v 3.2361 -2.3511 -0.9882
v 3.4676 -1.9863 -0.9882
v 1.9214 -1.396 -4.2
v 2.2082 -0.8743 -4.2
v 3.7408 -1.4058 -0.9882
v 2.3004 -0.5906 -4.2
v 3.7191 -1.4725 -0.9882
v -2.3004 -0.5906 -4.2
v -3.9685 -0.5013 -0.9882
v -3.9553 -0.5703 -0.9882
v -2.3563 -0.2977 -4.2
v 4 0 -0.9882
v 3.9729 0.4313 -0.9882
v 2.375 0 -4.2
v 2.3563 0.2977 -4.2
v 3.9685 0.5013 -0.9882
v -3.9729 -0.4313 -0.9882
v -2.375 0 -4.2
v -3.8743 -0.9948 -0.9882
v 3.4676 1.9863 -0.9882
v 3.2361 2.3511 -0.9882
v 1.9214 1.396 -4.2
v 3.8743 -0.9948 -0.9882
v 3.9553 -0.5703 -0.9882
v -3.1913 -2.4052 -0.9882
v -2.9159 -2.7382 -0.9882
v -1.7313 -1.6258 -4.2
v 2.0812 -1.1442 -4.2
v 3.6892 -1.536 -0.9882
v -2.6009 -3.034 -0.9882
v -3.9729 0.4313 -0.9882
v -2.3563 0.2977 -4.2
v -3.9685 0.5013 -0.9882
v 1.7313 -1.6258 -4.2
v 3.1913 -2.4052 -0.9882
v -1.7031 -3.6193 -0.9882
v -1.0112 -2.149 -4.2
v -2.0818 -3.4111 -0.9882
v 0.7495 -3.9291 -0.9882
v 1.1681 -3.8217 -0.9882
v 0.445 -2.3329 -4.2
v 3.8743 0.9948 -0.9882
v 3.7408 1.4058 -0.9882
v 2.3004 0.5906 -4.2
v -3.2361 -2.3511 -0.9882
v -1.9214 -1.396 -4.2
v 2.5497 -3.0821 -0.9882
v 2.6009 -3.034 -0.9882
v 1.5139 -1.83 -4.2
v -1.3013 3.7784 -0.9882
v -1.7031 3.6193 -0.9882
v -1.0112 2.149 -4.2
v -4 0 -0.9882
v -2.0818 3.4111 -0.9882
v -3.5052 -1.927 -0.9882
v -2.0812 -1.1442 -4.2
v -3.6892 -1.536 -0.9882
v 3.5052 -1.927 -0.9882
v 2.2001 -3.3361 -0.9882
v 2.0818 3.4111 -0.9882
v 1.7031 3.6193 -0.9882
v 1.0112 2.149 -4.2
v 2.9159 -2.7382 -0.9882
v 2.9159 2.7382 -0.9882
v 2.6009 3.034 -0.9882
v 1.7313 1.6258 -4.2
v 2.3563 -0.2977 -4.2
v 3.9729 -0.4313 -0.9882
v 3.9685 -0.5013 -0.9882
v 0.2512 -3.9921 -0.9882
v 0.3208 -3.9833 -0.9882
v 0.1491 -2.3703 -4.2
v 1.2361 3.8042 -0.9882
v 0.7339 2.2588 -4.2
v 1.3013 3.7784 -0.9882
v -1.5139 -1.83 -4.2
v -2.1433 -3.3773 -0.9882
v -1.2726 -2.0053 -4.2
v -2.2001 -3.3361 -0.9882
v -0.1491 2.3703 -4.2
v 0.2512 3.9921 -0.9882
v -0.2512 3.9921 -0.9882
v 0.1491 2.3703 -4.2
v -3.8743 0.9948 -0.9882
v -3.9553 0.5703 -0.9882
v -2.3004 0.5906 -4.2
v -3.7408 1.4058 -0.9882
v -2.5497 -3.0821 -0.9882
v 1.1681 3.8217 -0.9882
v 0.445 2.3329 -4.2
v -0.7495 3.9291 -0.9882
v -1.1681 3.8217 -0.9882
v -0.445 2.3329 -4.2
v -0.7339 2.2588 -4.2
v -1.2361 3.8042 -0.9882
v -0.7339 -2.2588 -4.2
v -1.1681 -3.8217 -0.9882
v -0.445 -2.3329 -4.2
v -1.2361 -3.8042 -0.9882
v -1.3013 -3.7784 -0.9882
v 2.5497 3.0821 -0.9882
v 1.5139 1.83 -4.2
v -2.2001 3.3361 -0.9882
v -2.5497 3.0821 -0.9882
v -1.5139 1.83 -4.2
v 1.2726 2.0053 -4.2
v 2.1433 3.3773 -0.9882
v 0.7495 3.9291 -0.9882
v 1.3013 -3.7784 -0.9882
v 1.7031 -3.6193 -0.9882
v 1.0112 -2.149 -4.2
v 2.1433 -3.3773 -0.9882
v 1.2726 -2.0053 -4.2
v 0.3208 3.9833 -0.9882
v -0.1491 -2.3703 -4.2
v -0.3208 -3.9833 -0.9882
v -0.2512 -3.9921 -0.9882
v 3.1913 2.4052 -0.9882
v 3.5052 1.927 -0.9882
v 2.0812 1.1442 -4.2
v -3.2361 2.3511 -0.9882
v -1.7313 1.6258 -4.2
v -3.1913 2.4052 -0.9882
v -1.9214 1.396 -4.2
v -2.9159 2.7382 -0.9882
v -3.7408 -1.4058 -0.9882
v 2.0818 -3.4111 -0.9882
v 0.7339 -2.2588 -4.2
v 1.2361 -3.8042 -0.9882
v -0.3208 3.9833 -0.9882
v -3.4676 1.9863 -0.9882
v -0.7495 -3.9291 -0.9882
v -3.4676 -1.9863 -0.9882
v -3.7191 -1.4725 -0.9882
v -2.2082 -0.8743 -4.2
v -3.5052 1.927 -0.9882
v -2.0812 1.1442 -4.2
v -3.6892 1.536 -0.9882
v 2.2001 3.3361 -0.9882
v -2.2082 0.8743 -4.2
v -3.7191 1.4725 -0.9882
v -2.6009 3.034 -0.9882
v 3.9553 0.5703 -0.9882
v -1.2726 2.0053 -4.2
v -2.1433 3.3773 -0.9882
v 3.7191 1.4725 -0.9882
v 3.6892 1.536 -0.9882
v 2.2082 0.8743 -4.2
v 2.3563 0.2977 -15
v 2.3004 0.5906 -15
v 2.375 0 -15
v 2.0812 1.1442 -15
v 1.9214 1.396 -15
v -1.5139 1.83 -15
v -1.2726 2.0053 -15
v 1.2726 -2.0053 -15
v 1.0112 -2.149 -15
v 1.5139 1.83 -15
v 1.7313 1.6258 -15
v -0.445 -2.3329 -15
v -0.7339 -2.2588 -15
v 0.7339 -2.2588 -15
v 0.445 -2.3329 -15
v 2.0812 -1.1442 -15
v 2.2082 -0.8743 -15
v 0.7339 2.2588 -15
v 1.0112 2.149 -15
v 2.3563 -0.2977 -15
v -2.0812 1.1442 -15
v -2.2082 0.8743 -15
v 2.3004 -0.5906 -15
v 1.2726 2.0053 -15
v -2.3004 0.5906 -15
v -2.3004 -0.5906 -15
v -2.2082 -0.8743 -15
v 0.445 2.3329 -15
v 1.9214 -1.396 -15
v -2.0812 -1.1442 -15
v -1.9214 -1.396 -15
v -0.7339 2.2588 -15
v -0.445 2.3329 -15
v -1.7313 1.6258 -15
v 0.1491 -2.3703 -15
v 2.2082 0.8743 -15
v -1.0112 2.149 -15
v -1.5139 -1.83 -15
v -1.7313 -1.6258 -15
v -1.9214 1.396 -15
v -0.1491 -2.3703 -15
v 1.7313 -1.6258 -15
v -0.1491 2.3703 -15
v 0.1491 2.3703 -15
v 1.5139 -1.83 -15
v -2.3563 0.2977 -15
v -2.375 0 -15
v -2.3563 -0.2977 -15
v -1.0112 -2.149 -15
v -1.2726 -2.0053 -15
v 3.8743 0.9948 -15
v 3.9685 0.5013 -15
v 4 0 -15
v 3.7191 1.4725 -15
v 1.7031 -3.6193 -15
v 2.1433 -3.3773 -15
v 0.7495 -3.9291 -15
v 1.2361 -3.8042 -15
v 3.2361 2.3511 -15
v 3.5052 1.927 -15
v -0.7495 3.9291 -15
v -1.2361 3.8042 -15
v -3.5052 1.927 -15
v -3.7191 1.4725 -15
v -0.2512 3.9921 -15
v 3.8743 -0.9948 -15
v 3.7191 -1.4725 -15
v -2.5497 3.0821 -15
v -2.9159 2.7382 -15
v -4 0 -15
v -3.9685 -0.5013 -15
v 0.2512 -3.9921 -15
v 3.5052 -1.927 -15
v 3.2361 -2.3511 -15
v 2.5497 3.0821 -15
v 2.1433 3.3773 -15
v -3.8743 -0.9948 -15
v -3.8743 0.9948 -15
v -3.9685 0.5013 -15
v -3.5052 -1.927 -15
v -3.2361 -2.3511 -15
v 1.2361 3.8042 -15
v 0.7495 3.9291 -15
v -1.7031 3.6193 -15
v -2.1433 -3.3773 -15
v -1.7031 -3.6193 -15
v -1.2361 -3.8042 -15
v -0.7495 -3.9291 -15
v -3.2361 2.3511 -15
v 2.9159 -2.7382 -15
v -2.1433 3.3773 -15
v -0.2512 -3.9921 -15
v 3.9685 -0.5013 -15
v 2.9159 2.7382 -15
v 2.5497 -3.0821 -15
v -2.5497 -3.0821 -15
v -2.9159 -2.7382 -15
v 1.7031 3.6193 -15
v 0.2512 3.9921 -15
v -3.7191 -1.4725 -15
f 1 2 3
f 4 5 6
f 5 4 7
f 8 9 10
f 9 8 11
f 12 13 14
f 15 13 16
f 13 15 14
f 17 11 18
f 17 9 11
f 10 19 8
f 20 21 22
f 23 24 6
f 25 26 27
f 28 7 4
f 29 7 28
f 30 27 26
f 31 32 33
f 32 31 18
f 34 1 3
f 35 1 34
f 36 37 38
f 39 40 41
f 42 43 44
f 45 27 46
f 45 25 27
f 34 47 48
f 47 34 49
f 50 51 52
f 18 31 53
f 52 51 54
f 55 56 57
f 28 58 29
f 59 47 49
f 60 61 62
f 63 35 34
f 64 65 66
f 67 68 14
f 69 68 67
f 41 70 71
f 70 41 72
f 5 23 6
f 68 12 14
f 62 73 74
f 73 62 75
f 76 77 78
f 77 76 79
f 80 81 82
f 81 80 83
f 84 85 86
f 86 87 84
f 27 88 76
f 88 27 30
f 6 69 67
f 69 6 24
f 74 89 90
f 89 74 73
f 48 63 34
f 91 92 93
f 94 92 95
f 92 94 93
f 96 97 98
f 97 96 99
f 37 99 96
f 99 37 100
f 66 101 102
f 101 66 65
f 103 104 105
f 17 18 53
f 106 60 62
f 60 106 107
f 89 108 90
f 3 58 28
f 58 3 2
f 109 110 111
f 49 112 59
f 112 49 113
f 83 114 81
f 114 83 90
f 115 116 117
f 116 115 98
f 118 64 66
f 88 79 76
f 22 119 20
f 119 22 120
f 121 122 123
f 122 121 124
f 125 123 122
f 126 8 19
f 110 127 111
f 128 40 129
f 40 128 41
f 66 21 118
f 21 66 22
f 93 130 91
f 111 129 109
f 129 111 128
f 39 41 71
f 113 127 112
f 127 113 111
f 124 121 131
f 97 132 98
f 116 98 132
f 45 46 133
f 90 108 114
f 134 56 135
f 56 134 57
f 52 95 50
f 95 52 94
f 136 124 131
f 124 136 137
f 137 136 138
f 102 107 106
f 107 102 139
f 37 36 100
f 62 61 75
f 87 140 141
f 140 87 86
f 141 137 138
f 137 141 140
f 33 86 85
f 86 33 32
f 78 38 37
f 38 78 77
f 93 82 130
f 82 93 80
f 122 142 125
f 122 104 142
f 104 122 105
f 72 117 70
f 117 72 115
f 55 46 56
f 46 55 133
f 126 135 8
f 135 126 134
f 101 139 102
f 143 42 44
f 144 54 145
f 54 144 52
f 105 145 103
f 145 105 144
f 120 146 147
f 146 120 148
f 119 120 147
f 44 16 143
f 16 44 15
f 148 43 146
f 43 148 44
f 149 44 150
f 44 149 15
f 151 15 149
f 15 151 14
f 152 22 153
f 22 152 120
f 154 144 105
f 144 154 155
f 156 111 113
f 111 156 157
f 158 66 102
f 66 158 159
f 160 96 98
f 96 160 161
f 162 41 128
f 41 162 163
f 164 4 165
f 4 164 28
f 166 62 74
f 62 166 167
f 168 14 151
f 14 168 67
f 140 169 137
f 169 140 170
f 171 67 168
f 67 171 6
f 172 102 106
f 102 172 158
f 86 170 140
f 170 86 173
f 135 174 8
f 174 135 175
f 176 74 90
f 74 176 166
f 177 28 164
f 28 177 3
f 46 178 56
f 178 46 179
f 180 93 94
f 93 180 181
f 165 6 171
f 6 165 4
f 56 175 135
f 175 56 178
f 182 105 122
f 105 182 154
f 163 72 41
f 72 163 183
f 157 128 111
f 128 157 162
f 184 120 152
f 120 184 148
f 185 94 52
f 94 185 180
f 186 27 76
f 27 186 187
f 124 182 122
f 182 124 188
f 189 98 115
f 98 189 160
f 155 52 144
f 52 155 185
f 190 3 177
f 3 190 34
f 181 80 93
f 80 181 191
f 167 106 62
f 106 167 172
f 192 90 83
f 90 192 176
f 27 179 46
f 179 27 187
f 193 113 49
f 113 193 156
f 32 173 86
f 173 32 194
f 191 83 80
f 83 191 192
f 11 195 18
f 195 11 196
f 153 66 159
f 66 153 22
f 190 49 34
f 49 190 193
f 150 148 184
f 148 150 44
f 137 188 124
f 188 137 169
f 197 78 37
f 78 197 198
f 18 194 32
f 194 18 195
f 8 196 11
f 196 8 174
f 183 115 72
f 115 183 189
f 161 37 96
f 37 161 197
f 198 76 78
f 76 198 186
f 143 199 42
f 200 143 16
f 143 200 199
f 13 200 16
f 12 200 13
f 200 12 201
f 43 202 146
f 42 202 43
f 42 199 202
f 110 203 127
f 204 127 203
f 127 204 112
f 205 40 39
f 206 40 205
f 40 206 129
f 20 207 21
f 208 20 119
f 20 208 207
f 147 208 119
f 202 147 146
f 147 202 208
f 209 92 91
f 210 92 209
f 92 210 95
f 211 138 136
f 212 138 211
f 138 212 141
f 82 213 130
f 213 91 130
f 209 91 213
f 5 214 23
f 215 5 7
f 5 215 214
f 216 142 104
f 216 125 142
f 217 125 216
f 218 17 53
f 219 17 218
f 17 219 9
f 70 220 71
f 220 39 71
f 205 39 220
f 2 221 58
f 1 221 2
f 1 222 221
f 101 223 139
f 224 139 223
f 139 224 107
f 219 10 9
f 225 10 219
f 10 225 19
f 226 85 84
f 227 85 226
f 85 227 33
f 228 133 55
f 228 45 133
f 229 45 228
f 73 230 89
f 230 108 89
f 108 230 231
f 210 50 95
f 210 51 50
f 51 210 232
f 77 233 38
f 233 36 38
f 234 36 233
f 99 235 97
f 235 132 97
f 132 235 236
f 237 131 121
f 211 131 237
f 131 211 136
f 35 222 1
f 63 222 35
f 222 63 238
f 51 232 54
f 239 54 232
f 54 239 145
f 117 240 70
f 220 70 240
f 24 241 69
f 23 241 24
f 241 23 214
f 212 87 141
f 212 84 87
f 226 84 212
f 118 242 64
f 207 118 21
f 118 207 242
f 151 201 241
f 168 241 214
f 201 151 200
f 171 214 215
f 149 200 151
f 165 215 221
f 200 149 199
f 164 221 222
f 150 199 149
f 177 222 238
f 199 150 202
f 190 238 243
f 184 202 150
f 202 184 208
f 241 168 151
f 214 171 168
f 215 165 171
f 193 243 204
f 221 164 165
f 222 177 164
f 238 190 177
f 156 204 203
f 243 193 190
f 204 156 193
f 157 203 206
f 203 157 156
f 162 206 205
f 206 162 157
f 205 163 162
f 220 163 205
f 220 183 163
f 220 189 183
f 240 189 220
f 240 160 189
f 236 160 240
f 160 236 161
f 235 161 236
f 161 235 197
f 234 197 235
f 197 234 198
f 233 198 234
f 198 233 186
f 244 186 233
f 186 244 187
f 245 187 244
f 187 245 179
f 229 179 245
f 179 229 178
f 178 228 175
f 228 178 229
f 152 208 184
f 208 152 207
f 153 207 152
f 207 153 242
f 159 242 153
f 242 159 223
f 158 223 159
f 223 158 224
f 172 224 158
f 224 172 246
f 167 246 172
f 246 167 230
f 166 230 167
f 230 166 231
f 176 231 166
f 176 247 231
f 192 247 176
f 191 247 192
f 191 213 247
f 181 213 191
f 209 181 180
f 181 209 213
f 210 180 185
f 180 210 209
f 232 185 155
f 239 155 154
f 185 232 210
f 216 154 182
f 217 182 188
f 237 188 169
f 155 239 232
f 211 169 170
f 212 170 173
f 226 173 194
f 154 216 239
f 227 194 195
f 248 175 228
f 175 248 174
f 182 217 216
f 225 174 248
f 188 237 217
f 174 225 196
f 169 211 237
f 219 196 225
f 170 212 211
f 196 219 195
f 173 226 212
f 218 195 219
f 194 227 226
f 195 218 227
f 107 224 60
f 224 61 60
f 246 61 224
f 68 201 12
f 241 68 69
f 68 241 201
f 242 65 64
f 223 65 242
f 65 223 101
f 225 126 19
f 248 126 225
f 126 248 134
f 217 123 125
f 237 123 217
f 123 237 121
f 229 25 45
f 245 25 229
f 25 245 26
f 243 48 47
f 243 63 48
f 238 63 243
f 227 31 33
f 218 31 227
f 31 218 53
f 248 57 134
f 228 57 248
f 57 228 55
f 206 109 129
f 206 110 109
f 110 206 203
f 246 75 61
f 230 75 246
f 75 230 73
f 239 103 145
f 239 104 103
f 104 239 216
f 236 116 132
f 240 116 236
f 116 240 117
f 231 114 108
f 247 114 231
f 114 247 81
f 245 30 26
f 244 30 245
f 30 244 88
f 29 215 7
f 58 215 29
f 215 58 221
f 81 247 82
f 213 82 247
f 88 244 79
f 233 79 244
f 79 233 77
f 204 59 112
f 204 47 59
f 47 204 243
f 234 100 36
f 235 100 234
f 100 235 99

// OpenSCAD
$fn = 50;

difference() {
	union() {
		translate(v = [0, 0, -15.0]) {
			cylinder(h = 18, r = 4.0);
		}
	}
	union() {
		translate(v = [0, 0, 0]) {
			rotate(a = [0, 0, 0]) {
				difference() {
					union() {
						translate(v = [0, 0, -18.0]) {
							cylinder(h = 18, r = 2.25);
						}
						translate(v = [0, 0, -4.2]) {
							cylinder(h = 4.2, r1 = 2.375, r2 = 4.5);
						}
						translate(v = [0, 0, -18.0]) {
							cylinder(h = 18, r = 2.375);
						}
						translate(v = [0, 0, -18.0]) {
							cylinder(h = 18, r = 2.25);
						}
					}
					union();
				}
			}
		}
		#cylinder(h = 3, r = 5.0);
	}
}
